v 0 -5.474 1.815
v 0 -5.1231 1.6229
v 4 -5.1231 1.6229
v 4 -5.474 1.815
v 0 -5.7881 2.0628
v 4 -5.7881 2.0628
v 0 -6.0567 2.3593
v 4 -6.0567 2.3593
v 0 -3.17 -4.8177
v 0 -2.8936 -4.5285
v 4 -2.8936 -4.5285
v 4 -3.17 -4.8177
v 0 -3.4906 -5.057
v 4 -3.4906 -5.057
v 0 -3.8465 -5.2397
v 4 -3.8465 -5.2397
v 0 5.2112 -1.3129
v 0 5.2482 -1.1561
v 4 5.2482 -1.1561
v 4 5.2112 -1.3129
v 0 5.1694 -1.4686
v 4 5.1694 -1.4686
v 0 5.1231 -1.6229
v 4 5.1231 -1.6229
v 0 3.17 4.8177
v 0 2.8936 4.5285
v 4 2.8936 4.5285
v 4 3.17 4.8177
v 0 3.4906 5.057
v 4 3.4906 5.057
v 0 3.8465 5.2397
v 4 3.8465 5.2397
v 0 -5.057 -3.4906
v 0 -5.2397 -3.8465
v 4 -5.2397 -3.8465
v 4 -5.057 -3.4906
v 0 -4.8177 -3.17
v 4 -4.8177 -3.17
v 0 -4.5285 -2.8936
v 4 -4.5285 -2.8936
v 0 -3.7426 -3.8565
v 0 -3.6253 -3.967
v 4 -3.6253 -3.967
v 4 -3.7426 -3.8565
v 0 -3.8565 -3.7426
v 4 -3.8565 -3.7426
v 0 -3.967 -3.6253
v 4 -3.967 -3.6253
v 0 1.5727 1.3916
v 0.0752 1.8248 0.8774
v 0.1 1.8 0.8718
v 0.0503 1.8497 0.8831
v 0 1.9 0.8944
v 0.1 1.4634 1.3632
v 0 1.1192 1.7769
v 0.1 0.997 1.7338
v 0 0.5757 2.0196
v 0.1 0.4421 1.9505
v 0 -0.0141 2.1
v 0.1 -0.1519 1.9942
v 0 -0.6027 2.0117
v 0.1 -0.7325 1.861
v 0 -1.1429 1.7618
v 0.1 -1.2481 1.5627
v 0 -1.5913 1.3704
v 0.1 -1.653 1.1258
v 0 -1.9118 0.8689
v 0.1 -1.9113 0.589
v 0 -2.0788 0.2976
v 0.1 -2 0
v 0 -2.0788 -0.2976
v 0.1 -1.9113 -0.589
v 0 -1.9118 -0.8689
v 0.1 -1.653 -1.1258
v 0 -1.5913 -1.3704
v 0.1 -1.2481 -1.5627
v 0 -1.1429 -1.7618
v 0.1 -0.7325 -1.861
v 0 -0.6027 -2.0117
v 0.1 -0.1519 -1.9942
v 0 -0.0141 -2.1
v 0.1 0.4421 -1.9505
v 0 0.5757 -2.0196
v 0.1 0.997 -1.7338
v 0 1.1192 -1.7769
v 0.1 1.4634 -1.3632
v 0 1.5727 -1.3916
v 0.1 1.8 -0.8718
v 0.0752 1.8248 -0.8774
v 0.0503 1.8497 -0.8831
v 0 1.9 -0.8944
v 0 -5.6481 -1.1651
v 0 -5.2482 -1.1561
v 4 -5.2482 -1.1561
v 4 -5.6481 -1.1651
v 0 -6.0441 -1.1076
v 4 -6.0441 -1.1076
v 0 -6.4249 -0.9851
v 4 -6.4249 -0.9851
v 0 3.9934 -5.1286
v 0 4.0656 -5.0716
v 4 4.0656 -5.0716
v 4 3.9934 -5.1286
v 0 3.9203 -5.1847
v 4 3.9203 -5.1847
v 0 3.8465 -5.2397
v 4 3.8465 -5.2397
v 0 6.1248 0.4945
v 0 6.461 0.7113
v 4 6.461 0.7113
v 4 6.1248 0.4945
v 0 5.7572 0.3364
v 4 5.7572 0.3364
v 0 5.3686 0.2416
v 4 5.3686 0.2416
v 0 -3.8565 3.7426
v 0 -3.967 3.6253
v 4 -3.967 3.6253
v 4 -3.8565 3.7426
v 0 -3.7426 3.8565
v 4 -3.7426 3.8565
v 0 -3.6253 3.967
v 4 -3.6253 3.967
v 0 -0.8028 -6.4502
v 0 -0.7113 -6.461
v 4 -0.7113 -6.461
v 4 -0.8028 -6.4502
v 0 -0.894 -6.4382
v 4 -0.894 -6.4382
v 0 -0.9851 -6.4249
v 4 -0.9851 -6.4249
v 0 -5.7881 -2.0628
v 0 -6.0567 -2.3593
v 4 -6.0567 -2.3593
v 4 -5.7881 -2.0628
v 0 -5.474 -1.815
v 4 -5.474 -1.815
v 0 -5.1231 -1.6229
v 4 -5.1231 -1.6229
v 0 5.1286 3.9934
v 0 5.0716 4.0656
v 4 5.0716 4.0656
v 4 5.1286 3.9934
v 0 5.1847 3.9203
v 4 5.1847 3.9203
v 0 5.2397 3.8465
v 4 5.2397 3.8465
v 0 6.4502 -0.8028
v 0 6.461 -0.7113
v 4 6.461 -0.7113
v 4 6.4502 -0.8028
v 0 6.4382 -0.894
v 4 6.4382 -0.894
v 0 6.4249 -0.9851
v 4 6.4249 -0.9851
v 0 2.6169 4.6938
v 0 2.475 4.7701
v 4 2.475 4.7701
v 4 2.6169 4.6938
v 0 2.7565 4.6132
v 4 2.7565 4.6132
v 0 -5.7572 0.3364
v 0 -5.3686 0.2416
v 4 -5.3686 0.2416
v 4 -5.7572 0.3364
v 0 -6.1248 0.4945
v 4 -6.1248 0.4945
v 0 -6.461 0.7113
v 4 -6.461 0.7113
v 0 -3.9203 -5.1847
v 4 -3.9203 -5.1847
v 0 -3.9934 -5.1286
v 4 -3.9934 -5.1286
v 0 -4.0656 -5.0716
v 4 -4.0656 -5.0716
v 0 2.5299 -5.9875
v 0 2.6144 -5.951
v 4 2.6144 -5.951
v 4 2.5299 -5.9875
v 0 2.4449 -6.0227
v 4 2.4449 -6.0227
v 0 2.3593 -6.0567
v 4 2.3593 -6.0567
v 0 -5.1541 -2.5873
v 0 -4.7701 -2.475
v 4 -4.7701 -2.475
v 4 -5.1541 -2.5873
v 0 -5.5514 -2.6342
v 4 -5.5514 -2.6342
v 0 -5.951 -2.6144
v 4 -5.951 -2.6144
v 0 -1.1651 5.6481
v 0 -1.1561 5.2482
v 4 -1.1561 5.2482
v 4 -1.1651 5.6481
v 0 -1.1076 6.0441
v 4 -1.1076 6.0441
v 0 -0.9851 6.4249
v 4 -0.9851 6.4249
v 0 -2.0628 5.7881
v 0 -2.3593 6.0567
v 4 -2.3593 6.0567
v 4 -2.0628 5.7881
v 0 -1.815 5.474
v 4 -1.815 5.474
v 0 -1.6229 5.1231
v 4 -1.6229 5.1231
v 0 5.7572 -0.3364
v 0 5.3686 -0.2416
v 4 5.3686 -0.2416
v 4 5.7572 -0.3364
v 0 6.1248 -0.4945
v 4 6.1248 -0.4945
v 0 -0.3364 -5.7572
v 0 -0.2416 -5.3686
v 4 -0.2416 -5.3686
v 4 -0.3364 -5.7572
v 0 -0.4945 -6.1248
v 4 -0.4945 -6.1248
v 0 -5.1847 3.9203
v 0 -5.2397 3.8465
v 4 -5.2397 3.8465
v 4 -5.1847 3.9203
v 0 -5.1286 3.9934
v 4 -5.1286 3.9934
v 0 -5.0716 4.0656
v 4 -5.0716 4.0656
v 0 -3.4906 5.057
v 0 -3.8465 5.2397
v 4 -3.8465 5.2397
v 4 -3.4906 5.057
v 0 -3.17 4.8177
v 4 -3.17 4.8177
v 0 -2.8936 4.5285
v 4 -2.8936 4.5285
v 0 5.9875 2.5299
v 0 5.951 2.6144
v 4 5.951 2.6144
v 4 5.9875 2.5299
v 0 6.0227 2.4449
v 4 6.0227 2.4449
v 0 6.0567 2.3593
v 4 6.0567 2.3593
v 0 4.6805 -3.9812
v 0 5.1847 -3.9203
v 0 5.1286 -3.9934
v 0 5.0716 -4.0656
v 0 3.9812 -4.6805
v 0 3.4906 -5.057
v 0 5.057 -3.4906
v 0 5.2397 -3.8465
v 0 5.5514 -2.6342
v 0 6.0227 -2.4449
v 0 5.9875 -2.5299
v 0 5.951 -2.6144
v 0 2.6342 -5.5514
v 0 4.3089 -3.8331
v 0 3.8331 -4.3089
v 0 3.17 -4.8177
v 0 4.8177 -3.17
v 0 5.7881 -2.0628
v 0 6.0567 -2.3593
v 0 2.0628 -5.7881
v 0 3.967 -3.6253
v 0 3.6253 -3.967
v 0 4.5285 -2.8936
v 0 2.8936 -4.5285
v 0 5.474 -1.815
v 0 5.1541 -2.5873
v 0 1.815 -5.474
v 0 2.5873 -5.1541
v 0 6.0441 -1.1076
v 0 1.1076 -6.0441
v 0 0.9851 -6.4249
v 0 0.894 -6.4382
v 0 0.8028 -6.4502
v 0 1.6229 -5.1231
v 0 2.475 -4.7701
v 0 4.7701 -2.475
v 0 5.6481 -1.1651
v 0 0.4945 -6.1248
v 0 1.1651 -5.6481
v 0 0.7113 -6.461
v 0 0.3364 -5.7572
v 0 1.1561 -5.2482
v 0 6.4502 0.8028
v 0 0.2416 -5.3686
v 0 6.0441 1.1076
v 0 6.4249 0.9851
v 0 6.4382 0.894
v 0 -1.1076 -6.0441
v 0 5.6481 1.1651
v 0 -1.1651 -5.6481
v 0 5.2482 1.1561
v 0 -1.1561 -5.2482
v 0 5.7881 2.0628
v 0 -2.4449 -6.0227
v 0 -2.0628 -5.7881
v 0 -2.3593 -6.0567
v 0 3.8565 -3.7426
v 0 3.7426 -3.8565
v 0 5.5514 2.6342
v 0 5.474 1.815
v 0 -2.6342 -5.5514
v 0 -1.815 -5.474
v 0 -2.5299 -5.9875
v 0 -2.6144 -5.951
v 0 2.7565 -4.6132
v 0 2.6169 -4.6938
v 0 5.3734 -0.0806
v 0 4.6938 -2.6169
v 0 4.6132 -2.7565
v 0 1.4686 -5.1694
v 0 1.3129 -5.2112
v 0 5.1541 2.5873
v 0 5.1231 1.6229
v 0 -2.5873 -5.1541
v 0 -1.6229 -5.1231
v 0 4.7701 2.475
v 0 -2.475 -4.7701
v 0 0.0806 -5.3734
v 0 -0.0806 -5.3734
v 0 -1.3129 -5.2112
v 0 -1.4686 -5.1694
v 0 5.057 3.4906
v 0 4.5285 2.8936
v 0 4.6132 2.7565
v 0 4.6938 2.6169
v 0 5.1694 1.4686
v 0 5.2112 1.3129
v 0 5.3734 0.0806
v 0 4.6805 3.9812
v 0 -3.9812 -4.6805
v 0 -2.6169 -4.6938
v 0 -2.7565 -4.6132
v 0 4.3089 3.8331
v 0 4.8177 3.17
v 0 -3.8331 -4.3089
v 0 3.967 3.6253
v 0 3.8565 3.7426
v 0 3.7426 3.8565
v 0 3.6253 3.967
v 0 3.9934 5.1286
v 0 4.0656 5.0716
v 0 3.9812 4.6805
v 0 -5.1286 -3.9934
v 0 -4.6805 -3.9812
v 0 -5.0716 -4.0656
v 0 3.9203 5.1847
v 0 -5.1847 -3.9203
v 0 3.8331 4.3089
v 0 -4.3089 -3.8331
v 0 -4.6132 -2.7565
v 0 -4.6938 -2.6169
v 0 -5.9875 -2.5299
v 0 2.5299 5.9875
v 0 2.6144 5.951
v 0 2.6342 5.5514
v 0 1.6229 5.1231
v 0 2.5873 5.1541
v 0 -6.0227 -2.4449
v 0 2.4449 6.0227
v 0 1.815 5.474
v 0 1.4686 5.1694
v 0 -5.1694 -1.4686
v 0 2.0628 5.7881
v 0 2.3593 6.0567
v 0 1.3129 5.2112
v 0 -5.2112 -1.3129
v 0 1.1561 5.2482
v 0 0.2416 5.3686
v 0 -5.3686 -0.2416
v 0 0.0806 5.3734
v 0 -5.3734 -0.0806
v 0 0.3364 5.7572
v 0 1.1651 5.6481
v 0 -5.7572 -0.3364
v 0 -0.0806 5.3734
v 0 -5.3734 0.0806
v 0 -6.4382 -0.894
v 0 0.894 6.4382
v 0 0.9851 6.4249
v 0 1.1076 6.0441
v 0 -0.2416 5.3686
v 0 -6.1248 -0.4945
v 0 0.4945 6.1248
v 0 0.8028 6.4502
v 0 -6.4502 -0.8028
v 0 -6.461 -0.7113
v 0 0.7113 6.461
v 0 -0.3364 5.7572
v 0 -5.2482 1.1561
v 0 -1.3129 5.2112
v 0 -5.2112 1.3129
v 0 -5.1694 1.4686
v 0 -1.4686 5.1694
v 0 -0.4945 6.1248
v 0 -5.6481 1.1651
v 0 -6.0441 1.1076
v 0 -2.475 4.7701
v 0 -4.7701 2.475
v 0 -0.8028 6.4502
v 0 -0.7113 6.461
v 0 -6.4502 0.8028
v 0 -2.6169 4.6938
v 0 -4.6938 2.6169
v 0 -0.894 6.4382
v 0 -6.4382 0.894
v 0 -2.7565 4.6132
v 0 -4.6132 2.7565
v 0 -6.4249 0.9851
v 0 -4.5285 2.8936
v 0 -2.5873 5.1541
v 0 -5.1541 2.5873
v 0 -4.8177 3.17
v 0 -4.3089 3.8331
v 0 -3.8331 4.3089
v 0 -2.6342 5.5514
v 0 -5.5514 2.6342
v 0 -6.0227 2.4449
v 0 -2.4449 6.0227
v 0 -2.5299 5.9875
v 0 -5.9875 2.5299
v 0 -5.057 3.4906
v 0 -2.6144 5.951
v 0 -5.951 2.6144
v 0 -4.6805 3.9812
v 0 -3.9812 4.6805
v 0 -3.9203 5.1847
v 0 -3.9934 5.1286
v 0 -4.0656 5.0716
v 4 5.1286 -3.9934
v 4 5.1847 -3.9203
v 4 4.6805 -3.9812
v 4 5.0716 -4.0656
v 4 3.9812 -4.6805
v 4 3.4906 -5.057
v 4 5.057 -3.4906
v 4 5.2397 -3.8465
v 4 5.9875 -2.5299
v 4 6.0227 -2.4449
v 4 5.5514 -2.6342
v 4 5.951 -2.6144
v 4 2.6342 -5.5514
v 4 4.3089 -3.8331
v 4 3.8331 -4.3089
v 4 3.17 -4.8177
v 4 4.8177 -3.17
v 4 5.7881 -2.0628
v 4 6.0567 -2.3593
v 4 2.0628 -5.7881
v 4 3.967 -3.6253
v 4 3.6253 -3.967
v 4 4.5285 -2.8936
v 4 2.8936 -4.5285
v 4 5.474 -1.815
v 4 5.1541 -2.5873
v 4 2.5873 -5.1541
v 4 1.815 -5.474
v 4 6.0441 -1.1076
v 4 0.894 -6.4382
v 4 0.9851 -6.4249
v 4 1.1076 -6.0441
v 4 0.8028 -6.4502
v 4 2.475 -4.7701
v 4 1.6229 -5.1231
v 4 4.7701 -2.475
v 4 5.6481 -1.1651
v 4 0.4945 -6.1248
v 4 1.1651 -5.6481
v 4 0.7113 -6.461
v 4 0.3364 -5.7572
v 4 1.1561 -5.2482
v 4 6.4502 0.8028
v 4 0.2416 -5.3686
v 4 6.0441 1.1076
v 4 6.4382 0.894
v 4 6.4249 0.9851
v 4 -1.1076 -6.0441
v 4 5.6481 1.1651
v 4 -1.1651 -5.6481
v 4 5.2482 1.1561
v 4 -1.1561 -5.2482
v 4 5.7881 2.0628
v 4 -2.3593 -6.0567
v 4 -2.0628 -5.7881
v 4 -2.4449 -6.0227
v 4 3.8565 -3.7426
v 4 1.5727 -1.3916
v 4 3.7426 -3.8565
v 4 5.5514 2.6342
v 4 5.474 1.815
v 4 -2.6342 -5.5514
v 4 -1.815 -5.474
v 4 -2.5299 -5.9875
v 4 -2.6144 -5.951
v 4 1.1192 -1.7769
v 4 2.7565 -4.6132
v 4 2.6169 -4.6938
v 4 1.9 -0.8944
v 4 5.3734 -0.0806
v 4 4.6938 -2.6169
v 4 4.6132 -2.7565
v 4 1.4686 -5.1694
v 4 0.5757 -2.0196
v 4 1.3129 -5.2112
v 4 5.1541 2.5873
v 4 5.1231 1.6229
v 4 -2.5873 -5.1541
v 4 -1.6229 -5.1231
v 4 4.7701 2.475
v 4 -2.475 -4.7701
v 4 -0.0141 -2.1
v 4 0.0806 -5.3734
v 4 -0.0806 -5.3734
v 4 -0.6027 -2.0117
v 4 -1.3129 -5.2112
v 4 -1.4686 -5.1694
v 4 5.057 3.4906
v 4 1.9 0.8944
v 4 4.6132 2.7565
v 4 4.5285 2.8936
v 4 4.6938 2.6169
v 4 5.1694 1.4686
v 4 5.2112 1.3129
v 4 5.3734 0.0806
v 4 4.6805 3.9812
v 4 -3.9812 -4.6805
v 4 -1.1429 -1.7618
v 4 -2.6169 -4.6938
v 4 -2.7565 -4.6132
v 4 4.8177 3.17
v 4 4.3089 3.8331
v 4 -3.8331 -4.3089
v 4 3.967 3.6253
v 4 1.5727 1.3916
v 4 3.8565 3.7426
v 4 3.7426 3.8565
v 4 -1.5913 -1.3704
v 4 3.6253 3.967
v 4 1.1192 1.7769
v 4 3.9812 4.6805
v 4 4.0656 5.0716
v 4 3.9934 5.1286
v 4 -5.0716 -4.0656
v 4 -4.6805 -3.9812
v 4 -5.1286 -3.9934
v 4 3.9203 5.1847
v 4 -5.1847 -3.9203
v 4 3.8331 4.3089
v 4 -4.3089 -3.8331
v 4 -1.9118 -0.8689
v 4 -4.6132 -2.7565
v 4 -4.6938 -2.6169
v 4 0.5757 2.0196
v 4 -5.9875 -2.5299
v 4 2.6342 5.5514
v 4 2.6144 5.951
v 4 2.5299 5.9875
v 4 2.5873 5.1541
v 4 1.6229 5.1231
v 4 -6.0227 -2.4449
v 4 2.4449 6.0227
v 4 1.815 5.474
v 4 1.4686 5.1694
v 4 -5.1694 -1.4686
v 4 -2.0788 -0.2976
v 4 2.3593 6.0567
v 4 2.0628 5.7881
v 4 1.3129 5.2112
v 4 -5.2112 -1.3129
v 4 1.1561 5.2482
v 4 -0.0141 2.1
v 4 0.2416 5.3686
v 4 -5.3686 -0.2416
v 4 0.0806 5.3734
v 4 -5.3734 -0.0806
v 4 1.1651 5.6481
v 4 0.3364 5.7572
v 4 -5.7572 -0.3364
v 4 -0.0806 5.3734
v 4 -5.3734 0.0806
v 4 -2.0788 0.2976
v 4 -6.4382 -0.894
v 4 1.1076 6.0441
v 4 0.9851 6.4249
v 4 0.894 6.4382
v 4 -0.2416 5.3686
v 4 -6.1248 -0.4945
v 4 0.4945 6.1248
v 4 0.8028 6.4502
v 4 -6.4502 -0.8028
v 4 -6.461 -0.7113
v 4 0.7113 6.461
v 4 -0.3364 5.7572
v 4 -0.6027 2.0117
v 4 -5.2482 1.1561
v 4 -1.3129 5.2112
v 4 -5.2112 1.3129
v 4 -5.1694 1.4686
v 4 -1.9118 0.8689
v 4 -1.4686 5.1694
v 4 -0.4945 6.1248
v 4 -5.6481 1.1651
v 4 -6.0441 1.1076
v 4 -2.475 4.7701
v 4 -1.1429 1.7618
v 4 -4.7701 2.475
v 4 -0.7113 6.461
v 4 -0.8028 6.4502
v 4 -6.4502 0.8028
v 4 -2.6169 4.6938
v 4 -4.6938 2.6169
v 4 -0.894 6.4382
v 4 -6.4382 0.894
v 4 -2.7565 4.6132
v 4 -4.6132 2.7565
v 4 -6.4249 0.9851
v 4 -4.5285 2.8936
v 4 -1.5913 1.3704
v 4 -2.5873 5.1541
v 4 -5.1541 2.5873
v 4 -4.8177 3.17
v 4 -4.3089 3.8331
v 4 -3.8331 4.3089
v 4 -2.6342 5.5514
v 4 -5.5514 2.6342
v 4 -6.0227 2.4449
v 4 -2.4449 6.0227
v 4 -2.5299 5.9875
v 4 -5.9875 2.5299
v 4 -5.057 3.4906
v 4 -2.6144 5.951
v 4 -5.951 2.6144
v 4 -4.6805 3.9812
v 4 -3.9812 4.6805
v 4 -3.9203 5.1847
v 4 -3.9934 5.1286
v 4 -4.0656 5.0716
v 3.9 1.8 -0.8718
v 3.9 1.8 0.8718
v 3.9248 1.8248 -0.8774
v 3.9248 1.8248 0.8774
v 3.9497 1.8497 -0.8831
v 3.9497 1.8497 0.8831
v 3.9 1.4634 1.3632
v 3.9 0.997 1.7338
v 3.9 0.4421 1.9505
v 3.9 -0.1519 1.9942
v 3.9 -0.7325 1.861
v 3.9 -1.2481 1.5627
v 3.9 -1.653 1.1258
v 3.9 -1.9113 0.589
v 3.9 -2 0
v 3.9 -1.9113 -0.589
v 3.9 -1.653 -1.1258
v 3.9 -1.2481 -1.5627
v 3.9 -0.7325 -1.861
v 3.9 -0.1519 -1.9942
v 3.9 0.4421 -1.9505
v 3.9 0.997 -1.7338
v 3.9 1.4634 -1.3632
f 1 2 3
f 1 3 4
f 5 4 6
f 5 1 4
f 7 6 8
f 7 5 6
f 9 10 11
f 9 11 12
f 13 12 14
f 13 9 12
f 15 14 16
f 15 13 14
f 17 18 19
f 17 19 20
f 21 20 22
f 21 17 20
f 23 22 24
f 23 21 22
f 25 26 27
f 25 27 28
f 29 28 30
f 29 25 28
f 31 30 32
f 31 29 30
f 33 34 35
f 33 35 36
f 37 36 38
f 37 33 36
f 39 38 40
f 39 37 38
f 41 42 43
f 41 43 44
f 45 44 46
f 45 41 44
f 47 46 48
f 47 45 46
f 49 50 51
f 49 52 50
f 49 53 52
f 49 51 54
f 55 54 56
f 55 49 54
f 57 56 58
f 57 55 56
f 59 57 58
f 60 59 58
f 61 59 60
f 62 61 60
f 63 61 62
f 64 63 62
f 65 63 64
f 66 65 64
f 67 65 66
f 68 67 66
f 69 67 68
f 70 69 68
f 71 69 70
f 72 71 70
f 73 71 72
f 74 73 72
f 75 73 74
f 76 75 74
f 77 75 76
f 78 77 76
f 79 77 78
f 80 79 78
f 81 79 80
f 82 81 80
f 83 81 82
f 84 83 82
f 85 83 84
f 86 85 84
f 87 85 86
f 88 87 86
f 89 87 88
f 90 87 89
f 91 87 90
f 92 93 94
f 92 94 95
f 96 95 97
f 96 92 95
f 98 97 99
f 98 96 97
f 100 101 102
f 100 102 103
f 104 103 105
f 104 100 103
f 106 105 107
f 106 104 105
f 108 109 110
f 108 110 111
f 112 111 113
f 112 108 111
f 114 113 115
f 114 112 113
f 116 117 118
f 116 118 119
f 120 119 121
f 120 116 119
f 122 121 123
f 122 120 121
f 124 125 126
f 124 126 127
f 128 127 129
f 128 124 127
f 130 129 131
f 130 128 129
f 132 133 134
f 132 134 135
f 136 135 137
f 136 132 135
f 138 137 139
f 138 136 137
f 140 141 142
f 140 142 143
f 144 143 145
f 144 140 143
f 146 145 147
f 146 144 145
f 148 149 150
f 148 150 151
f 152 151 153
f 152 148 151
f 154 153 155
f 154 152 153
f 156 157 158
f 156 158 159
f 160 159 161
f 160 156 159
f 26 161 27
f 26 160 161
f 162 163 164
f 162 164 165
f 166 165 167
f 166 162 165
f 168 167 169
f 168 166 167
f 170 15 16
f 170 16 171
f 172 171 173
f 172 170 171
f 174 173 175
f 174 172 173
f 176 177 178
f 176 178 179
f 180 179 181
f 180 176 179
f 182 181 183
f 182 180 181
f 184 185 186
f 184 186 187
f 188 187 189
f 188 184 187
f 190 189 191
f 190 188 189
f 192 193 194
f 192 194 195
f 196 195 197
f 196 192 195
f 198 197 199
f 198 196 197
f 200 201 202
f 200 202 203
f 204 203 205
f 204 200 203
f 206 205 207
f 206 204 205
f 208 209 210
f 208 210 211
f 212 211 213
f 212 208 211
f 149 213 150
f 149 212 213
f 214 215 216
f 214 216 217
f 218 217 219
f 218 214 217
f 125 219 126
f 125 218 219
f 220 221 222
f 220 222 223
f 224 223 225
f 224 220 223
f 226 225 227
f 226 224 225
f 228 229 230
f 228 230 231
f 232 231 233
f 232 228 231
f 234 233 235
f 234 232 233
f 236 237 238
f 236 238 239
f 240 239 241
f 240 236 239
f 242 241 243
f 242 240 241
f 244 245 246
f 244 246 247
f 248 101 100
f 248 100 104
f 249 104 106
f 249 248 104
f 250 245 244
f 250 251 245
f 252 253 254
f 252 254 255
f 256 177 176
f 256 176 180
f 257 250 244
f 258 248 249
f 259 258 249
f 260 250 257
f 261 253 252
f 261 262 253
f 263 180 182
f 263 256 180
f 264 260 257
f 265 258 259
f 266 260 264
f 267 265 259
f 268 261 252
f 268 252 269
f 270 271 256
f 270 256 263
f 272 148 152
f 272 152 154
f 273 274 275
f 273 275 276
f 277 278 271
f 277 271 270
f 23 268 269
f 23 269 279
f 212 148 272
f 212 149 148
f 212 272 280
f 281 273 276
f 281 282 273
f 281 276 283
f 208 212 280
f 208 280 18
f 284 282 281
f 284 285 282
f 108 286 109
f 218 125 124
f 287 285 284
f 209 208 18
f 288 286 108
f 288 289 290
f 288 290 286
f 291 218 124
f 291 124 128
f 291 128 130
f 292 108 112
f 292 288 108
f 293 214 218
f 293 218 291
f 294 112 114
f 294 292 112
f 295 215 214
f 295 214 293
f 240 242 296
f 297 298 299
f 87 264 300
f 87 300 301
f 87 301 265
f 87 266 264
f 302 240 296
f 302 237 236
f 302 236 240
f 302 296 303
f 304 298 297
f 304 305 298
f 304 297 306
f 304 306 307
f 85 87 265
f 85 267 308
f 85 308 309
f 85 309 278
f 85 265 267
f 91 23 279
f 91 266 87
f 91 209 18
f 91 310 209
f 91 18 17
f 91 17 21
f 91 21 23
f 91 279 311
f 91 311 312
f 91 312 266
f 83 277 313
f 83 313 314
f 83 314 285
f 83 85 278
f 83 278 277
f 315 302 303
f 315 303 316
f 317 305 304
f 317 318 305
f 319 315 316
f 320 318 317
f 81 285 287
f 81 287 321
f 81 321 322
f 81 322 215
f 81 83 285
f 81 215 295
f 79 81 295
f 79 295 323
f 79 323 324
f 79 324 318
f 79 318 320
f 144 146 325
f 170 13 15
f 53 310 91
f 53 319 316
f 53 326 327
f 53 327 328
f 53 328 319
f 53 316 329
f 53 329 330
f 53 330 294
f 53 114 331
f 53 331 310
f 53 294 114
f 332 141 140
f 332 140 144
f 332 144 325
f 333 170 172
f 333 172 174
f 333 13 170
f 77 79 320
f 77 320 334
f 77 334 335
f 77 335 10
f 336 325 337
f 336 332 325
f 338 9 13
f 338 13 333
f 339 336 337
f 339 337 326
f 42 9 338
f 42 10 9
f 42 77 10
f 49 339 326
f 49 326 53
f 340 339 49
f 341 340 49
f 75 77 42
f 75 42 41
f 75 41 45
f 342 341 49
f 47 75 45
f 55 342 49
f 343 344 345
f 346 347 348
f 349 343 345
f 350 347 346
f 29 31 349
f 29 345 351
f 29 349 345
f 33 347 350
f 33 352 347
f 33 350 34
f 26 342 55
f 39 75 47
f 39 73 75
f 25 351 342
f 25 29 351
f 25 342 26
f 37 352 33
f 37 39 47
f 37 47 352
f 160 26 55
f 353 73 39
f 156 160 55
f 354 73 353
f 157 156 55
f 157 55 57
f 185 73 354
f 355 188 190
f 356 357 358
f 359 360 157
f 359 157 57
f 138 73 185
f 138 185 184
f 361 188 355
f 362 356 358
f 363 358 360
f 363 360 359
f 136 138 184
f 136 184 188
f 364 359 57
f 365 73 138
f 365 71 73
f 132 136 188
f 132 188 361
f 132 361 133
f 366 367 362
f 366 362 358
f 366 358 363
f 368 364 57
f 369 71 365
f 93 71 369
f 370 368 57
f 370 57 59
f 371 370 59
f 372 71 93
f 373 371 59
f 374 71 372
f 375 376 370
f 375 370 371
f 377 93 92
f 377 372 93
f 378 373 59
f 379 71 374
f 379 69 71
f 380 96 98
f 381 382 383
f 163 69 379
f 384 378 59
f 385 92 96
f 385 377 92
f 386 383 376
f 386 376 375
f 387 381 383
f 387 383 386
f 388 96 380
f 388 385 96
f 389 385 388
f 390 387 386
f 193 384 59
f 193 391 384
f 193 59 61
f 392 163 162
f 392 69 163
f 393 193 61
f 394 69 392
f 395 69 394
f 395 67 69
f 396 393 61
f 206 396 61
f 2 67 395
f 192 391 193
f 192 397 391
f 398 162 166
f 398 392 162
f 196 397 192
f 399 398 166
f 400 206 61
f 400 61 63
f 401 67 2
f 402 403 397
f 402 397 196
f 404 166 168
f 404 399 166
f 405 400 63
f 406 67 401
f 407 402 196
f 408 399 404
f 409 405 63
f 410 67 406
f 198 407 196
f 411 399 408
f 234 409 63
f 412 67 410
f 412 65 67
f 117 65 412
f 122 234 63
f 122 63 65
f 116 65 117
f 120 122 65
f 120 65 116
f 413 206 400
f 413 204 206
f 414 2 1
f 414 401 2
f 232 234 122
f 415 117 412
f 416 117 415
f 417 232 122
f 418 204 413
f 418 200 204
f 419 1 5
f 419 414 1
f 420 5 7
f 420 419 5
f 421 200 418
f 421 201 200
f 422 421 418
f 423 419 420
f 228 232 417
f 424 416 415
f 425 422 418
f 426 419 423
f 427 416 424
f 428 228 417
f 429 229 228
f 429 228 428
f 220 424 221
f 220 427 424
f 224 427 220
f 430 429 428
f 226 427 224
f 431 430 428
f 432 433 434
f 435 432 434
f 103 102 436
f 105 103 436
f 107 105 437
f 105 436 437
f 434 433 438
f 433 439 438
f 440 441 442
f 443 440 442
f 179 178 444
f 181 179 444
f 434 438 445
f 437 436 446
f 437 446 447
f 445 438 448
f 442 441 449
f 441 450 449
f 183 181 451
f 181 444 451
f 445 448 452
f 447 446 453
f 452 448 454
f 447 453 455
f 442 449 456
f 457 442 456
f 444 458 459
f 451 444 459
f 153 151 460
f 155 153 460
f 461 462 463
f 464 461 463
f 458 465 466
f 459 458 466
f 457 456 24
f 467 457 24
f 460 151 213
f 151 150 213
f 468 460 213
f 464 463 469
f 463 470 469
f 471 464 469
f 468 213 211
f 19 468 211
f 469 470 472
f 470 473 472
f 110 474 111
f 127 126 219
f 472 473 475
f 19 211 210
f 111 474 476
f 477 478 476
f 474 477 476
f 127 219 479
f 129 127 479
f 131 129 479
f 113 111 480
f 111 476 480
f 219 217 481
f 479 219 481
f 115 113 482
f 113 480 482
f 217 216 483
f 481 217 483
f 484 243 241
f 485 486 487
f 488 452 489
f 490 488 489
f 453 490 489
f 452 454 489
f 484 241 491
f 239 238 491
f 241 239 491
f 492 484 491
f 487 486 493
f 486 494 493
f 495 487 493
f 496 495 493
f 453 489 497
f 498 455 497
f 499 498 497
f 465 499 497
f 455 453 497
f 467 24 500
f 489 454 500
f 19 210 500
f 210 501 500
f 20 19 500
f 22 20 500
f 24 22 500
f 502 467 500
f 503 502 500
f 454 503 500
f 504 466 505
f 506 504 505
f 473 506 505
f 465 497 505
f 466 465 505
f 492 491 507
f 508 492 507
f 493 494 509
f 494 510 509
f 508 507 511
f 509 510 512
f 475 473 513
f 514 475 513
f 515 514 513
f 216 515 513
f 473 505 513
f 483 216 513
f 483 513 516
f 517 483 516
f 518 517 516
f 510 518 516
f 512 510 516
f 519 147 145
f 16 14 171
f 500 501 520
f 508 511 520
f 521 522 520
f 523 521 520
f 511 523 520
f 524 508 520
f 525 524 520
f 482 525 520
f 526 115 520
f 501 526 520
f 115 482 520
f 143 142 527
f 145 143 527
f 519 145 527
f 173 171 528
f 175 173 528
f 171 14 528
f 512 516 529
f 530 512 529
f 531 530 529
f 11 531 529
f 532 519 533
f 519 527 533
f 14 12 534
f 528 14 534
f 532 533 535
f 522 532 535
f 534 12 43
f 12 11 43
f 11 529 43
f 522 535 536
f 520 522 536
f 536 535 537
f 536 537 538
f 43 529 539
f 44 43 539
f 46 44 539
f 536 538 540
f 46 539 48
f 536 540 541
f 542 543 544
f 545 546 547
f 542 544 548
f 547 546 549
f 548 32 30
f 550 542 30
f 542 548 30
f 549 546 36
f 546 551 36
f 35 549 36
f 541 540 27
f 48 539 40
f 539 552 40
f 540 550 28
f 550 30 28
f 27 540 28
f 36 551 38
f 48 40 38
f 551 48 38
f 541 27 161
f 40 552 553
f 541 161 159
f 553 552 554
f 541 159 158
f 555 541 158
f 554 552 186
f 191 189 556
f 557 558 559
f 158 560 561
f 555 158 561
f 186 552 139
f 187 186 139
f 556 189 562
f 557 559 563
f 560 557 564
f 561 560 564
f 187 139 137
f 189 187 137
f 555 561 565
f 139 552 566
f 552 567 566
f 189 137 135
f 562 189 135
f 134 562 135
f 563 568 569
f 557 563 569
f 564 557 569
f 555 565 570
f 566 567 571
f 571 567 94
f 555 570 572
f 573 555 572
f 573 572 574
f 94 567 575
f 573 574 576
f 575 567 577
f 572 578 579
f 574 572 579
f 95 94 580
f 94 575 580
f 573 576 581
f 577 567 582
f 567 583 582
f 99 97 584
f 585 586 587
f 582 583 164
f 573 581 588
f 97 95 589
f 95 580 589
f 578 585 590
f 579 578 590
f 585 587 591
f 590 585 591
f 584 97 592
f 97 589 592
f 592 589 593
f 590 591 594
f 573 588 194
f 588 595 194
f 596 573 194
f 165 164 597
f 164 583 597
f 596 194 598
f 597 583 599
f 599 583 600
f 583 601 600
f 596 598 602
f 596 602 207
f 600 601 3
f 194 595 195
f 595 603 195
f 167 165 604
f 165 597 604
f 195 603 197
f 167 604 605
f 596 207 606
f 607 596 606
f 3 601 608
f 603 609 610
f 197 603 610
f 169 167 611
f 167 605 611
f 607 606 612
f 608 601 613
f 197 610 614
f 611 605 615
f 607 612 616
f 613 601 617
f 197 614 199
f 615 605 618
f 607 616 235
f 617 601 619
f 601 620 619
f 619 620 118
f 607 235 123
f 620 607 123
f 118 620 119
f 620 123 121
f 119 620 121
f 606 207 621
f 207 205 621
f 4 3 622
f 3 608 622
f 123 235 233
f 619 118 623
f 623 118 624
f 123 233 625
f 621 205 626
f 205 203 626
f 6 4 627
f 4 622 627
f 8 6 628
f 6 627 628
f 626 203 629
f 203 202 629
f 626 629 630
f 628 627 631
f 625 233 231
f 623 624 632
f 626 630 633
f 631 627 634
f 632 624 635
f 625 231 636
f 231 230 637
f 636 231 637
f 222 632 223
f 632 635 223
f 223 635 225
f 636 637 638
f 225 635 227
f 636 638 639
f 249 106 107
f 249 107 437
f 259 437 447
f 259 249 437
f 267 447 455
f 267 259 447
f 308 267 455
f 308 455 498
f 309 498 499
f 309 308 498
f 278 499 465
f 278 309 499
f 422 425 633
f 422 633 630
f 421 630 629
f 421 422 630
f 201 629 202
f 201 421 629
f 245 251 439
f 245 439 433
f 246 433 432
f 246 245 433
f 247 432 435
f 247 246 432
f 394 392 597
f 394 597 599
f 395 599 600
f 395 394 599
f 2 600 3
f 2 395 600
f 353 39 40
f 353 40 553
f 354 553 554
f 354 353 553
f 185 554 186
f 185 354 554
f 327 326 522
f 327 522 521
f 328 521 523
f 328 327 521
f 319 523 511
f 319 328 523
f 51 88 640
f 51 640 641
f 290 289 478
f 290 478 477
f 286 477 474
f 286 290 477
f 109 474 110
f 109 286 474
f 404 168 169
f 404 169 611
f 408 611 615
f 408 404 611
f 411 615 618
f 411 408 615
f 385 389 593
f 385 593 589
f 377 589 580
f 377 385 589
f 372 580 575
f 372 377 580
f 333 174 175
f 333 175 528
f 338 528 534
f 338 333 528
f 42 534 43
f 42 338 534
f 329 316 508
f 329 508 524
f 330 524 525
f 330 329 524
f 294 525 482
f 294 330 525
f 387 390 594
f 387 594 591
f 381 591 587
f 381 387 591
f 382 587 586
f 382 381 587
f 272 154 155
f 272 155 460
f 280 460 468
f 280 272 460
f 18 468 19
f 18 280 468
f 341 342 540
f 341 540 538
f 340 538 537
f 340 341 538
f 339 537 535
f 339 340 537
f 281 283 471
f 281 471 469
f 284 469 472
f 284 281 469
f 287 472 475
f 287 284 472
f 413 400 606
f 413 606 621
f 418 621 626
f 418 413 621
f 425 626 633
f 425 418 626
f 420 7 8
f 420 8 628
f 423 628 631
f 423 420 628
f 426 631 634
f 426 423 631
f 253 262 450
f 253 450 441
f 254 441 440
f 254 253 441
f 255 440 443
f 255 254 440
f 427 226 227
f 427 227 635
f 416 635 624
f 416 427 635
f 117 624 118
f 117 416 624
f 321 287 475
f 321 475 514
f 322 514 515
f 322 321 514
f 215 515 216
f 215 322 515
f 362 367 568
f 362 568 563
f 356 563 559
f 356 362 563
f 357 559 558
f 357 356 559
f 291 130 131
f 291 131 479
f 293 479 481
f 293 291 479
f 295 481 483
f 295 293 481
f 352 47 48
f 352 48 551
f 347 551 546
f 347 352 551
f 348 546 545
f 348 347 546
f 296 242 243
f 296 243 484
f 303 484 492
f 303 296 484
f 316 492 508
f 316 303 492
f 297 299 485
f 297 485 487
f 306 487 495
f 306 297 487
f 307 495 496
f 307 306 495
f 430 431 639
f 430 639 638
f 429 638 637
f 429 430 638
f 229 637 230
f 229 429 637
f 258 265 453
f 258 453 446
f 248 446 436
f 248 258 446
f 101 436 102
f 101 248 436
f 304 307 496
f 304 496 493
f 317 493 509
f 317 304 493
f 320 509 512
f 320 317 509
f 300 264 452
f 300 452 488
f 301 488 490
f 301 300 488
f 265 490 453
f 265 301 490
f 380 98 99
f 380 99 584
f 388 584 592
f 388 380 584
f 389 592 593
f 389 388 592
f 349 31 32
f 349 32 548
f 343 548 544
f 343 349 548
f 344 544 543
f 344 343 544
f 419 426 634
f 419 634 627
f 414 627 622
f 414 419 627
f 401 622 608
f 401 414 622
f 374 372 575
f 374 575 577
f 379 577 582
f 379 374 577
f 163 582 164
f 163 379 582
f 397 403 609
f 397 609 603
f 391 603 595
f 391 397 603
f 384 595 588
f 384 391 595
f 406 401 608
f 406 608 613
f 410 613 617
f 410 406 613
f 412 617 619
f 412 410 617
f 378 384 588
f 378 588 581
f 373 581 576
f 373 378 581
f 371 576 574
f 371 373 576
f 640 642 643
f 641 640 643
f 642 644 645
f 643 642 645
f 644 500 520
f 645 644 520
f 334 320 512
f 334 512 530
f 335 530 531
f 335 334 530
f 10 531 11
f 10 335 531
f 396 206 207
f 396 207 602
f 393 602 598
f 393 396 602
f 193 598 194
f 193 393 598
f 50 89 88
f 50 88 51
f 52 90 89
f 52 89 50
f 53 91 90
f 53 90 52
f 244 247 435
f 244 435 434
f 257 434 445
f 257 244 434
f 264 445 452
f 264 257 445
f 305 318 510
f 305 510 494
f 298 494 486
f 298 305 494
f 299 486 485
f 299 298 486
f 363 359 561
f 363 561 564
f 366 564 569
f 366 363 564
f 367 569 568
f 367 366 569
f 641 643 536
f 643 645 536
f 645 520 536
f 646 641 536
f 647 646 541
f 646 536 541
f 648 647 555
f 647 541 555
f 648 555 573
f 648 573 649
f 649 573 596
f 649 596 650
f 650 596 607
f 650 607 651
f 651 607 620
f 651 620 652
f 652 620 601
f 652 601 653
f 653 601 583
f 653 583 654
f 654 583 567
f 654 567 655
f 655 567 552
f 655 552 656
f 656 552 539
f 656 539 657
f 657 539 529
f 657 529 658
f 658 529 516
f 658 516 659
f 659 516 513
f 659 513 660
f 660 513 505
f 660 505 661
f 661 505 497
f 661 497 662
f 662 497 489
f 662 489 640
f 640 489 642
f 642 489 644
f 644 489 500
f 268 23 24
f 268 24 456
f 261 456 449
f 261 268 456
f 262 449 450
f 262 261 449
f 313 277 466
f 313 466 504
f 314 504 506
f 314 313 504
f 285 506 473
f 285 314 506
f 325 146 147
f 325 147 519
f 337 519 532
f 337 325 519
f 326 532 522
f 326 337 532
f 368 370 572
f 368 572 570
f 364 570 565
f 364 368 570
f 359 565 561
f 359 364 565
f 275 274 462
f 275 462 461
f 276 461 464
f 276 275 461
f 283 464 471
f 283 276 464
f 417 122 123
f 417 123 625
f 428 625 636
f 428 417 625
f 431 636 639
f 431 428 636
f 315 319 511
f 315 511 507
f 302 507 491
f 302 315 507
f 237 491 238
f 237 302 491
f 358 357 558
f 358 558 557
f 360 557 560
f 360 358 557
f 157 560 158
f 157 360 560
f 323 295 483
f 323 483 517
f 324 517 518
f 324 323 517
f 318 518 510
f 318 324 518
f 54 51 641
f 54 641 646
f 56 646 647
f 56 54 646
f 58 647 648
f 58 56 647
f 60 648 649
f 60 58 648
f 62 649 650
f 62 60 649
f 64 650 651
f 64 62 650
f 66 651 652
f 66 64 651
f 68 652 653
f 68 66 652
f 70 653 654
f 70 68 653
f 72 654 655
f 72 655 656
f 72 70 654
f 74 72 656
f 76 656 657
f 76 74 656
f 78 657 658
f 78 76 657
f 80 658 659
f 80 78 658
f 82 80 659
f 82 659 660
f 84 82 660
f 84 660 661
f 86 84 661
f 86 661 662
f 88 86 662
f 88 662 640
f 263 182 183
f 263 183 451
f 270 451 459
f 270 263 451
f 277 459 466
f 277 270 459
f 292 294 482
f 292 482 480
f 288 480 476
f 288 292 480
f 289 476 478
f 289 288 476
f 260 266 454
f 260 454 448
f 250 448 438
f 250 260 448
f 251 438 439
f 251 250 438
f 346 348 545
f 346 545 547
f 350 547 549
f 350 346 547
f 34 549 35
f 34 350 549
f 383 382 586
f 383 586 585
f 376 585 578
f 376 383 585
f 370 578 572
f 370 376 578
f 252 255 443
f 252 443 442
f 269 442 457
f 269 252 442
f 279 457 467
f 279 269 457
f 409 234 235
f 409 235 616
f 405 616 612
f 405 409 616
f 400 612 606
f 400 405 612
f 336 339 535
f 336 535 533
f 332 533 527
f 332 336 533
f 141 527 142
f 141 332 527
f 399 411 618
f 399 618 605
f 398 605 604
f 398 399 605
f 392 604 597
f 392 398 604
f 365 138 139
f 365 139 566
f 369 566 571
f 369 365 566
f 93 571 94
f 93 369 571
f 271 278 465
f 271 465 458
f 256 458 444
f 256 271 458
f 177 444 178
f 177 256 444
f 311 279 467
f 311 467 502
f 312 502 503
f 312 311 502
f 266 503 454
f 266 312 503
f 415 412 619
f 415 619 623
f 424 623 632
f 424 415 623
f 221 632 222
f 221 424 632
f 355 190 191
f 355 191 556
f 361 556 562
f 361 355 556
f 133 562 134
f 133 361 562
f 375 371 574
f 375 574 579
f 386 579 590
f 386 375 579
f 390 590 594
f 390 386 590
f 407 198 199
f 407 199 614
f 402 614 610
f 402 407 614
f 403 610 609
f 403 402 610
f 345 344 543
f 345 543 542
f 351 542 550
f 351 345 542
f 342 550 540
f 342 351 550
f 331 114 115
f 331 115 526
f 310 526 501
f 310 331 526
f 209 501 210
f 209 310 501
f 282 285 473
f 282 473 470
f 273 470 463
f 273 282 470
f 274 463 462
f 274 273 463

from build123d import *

# Parameters (mm, degrees)
EXTRUDE_1_DEPTH = 4
CHAMFER_1_SIZE  = 0.1


with BuildPart() as part:
    # 草图1 → 凸台-拉伸1 (new body)
    with BuildSketch(Plane(origin=(0, 0, 0), x_dir=(0, -1, 0), z_dir=(-1, 0, 0))):
        with BuildLine():
            ThreePointArc((-0.711337602, 6.460959589), (-0.848420249, 6.444391599), (-0.98512003, 6.424915449))
            ThreePointArc((-0.98512003, 6.424915449), (-1.144628565, 5.84730165), (-1.156074481, 5.248177569))
            ThreePointArc((-1.156074481, 5.248177569), (-1.390893548, 5.19088539), (-1.622898915, 5.123092339))
            ThreePointArc((-1.622898915, 5.123092339), (-1.93237341, 5.636226055), (-2.359318752, 6.056700011))
            ThreePointArc((-2.359318752, 6.056700011), (-2.48744231, 6.005216961), (-2.614443361, 5.951023938))
            ThreePointArc((-2.614443361, 5.951023938), (-2.619019322, 5.351808006), (-2.475010506, 4.770136161))
            ThreePointArc((-2.475010506, 4.770136161), (-2.687, 4.65402052), (-2.893553842, 4.528490053))
            ThreePointArc((-2.893553842, 4.528490053), (-3.325292028, 4.944041268), (-3.846516229, 5.239686336))
            ThreePointArc((-3.846516229, 5.239686336), (-3.956949289, 5.156796712), (-4.065596697, 5.071579981))
            ThreePointArc((-4.065596697, 5.071579981), (-3.91492824, 4.49159749), (-3.625278654, 3.967017857))
            ThreePointArc((-3.625278654, 3.967017857), (-3.799991842, 3.799991842), (-3.967017857, 3.625278654))
            ThreePointArc((-3.967017857, 3.625278654), (-4.49159749, 3.91492824), (-5.071579981, 4.065596697))
            ThreePointArc((-5.071579981, 4.065596697), (-5.156796712, 3.956949289), (-5.239686336, 3.846516229))
            ThreePointArc((-5.239686336, 3.846516229), (-4.944041268, 3.325292028), (-4.528490053, 2.893553842))
            ThreePointArc((-4.528490053, 2.893553842), (-4.65402052, 2.687), (-4.770136161, 2.475010506))
            ThreePointArc((-4.770136161, 2.475010506), (-5.351808006, 2.619019322), (-5.951023938, 2.614443361))
            ThreePointArc((-5.951023938, 2.614443361), (-6.005216961, 2.48744231), (-6.056700011, 2.359318752))
            ThreePointArc((-6.056700011, 2.359318752), (-5.636226055, 1.93237341), (-5.123092339, 1.622898915))
            ThreePointArc((-5.123092339, 1.622898915), (-5.19088539, 1.390893548), (-5.248177569, 1.156074481))
            ThreePointArc((-5.248177569, 1.156074481), (-5.84730165, 1.144628565), (-6.424915449, 0.98512003))
            ThreePointArc((-6.424915449, 0.98512003), (-6.444391599, 0.848420249), (-6.460959589, 0.711337602))
            ThreePointArc((-6.460959589, 0.711337602), (-5.94431135, 0.407766737), (-5.368564348, 0.241646108))
            ThreePointArc((-5.368564348, 0.241646108), (-5.374, 0), (-5.368564348, -0.241646108))
            ThreePointArc((-5.368564348, -0.241646108), (-5.94431135, -0.407766737), (-6.460959589, -0.711337602))
            ThreePointArc((-6.460959589, -0.711337602), (-6.444391599, -0.848420249), (-6.424915449, -0.98512003))
            ThreePointArc((-6.424915449, -0.98512003), (-5.84730165, -1.144628565), (-5.248177569, -1.156074481))
            ThreePointArc((-5.248177569, -1.156074481), (-5.19088539, -1.390893548), (-5.123092339, -1.622898915))
            ThreePointArc((-5.123092339, -1.622898915), (-5.636226055, -1.93237341), (-6.056700011, -2.359318752))
            ThreePointArc((-6.056700011, -2.359318752), (-6.005216961, -2.48744231), (-5.951023938, -2.614443361))
            ThreePointArc((-5.951023938, -2.614443361), (-5.351808006, -2.619019322), (-4.770136161, -2.475010506))
            ThreePointArc((-4.770136161, -2.475010506), (-4.65402052, -2.687), (-4.528490053, -2.893553842))
            ThreePointArc((-4.528490053, -2.893553842), (-4.944041268, -3.325292028), (-5.239686336, -3.846516229))
            ThreePointArc((-5.239686336, -3.846516229), (-5.156796712, -3.956949289), (-5.071579981, -4.065596697))
            ThreePointArc((-5.071579981, -4.065596697), (-4.49159749, -3.91492824), (-3.967017857, -3.625278654))
            ThreePointArc((-3.967017857, -3.625278654), (-3.799991842, -3.799991842), (-3.625278654, -3.967017857))
            ThreePointArc((-3.625278654, -3.967017857), (-3.91492824, -4.49159749), (-4.065596697, -5.071579981))
            ThreePointArc((-4.065596697, -5.071579981), (-3.956949289, -5.156796712), (-3.846516229, -5.239686336))
            ThreePointArc((-3.846516229, -5.239686336), (-3.325292028, -4.944041268), (-2.893553842, -4.528490053))
            ThreePointArc((-2.893553842, -4.528490053), (-2.687, -4.65402052), (-2.475010506, -4.770136161))
            ThreePointArc((-2.475010506, -4.770136161), (-2.619019322, -5.351808006), (-2.614443361, -5.951023938))
            ThreePointArc((-2.614443361, -5.951023938), (-2.48744231, -6.005216961), (-2.359318752, -6.056700011))
            ThreePointArc((-2.359318752, -6.056700011), (-1.93237341, -5.636226055), (-1.622898915, -5.123092339))
            ThreePointArc((-1.622898915, -5.123092339), (-1.390893548, -5.19088539), (-1.156074481, -5.248177569))
            ThreePointArc((-1.156074481, -5.248177569), (-1.144628565, -5.84730165), (-0.98512003, -6.424915449))
            ThreePointArc((-0.98512003, -6.424915449), (-0.848420249, -6.444391599), (-0.711337602, -6.460959589))
            ThreePointArc((-0.711337602, -6.460959589), (-0.407766737, -5.94431135), (-0.241646108, -5.368564348))
            ThreePointArc((-0.241646108, -5.368564348), (0, -5.374), (0.241646108, -5.368564348))
            ThreePointArc((0.241646108, -5.368564348), (0.407766737, -5.94431135), (0.711337602, -6.460959589))
            ThreePointArc((0.711337602, -6.460959589), (0.848420249, -6.444391599), (0.98512003, -6.424915449))
            ThreePointArc((0.98512003, -6.424915449), (1.144628565, -5.84730165), (1.156074481, -5.248177569))
            ThreePointArc((1.156074481, -5.248177569), (1.390893548, -5.19088539), (1.622898915, -5.123092339))
            ThreePointArc((1.622898915, -5.123092339), (1.93237341, -5.636226055), (2.359318752, -6.056700011))
            ThreePointArc((2.359318752, -6.056700011), (2.48744231, -6.005216961), (2.614443361, -5.951023938))
            ThreePointArc((2.614443361, -5.951023938), (2.619019322, -5.351808006), (2.475010506, -4.770136161))
            ThreePointArc((2.475010506, -4.770136161), (2.687, -4.65402052), (2.893553842, -4.528490053))
            ThreePointArc((2.893553842, -4.528490053), (3.325292028, -4.944041268), (3.846516229, -5.239686336))
            ThreePointArc((3.846516229, -5.239686336), (3.956949289, -5.156796712), (4.065596697, -5.071579981))
            ThreePointArc((4.065596697, -5.071579981), (3.91492824, -4.49159749), (3.625278654, -3.967017857))
            ThreePointArc((3.625278654, -3.967017857), (3.799991842, -3.799991842), (3.967017857, -3.625278654))
            ThreePointArc((3.967017857, -3.625278654), (4.49159749, -3.91492824), (5.071579981, -4.065596697))
            ThreePointArc((5.071579981, -4.065596697), (5.156796712, -3.956949289), (5.239686336, -3.846516229))
            ThreePointArc((5.239686336, -3.846516229), (4.944041268, -3.325292028), (4.528490053, -2.893553842))
            ThreePointArc((4.528490053, -2.893553842), (4.65402052, -2.687), (4.770136161, -2.475010506))
            ThreePointArc((4.770136161, -2.475010506), (5.351808006, -2.619019322), (5.951023938, -2.614443361))
            ThreePointArc((5.951023938, -2.614443361), (6.005216961, -2.48744231), (6.056700011, -2.359318752))
            ThreePointArc((6.056700011, -2.359318752), (5.636226055, -1.93237341), (5.123092339, -1.622898915))
            ThreePointArc((5.123092339, -1.622898915), (5.19088539, -1.390893548), (5.248177569, -1.156074481))
            ThreePointArc((5.248177569, -1.156074481), (5.84730165, -1.144628565), (6.424915449, -0.98512003))
            ThreePointArc((6.424915449, -0.98512003), (6.444391599, -0.848420249), (6.460959589, -0.711337602))
            ThreePointArc((6.460959589, -0.711337602), (5.94431135, -0.407766737), (5.368564348, -0.241646108))
            ThreePointArc((5.368564348, -0.241646108), (5.374, 0), (5.368564348, 0.241646108))
            ThreePointArc((5.368564348, 0.241646108), (5.94431135, 0.407766737), (6.460959589, 0.711337602))
            ThreePointArc((6.460959589, 0.711337602), (6.444391599, 0.848420249), (6.424915449, 0.98512003))
            ThreePointArc((6.424915449, 0.98512003), (5.84730165, 1.144628565), (5.248177569, 1.156074481))
            ThreePointArc((5.248177569, 1.156074481), (5.19088539, 1.390893548), (5.123092339, 1.622898915))
            ThreePointArc((5.123092339, 1.622898915), (5.636226055, 1.93237341), (6.056700011, 2.359318752))
            ThreePointArc((6.056700011, 2.359318752), (6.005216961, 2.48744231), (5.951023938, 2.614443361))
            ThreePointArc((5.951023938, 2.614443361), (5.351808006, 2.619019322), (4.770136161, 2.475010506))
            ThreePointArc((4.770136161, 2.475010506), (4.65402052, 2.687), (4.528490053, 2.893553842))
            ThreePointArc((4.528490053, 2.893553842), (4.944041268, 3.325292028), (5.239686336, 3.846516229))
            ThreePointArc((5.239686336, 3.846516229), (5.156796712, 3.956949289), (5.071579981, 4.065596697))
            ThreePointArc((5.071579981, 4.065596697), (4.49159749, 3.91492824), (3.967017857, 3.625278654))
            ThreePointArc((3.967017857, 3.625278654), (3.799991842, 3.799991842), (3.625278654, 3.967017857))
            ThreePointArc((3.625278654, 3.967017857), (3.91492824, 4.49159749), (4.065596697, 5.071579981))
            ThreePointArc((4.065596697, 5.071579981), (3.956949289, 5.156796712), (3.846516229, 5.239686336))
            ThreePointArc((3.846516229, 5.239686336), (3.325292028, 4.944041268), (2.893553842, 4.528490053))
            ThreePointArc((2.893553842, 4.528490053), (2.687, 4.65402052), (2.475010506, 4.770136161))
            ThreePointArc((2.475010506, 4.770136161), (2.619019322, 5.351808006), (2.614443361, 5.951023938))
            ThreePointArc((2.614443361, 5.951023938), (2.48744231, 6.005216961), (2.359318752, 6.056700011))
            ThreePointArc((2.359318752, 6.056700011), (1.93237341, 5.636226055), (1.622898915, 5.123092339))
            ThreePointArc((1.622898915, 5.123092339), (1.390893548, 5.19088539), (1.156074481, 5.248177569))
            ThreePointArc((1.156074481, 5.248177569), (1.144628565, 5.84730165), (0.98512003, 6.424915449))
            ThreePointArc((0.98512003, 6.424915449), (0.848420249, 6.444391599), (0.711337602, 6.460959589))
            ThreePointArc((0.711337602, 6.460959589), (0.407766737, 5.94431135), (0.241646108, 5.368564348))
            ThreePointArc((0.241646108, 5.368564348), (0, 5.374), (-0.241646108, 5.368564348))
            ThreePointArc((-0.241646108, 5.368564348), (-0.407766737, 5.94431135), (-0.711337602, 6.460959589))
        make_face()
        with BuildLine():
            Line((-1.8, -0.871779789), (-1.8, 0.871779789))
            ThreePointArc((-1.8, 0.871779789), (2, 0), (-1.8, -0.871779789))
        make_face(mode=Mode.SUBTRACT)
    extrude(amount=-EXTRUDE_1_DEPTH)

    # 倒角1
    chamfer_1_edges = [part.edges().sort_by_distance(p)[0] for p in [
        (4, -2, 0),
        (4, 1.8, 0),
        (0, -2, 0),
        (0, 1.8, 0),
    ]]
    chamfer(chamfer_1_edges, length=CHAMFER_1_SIZE)


solid = part.part
